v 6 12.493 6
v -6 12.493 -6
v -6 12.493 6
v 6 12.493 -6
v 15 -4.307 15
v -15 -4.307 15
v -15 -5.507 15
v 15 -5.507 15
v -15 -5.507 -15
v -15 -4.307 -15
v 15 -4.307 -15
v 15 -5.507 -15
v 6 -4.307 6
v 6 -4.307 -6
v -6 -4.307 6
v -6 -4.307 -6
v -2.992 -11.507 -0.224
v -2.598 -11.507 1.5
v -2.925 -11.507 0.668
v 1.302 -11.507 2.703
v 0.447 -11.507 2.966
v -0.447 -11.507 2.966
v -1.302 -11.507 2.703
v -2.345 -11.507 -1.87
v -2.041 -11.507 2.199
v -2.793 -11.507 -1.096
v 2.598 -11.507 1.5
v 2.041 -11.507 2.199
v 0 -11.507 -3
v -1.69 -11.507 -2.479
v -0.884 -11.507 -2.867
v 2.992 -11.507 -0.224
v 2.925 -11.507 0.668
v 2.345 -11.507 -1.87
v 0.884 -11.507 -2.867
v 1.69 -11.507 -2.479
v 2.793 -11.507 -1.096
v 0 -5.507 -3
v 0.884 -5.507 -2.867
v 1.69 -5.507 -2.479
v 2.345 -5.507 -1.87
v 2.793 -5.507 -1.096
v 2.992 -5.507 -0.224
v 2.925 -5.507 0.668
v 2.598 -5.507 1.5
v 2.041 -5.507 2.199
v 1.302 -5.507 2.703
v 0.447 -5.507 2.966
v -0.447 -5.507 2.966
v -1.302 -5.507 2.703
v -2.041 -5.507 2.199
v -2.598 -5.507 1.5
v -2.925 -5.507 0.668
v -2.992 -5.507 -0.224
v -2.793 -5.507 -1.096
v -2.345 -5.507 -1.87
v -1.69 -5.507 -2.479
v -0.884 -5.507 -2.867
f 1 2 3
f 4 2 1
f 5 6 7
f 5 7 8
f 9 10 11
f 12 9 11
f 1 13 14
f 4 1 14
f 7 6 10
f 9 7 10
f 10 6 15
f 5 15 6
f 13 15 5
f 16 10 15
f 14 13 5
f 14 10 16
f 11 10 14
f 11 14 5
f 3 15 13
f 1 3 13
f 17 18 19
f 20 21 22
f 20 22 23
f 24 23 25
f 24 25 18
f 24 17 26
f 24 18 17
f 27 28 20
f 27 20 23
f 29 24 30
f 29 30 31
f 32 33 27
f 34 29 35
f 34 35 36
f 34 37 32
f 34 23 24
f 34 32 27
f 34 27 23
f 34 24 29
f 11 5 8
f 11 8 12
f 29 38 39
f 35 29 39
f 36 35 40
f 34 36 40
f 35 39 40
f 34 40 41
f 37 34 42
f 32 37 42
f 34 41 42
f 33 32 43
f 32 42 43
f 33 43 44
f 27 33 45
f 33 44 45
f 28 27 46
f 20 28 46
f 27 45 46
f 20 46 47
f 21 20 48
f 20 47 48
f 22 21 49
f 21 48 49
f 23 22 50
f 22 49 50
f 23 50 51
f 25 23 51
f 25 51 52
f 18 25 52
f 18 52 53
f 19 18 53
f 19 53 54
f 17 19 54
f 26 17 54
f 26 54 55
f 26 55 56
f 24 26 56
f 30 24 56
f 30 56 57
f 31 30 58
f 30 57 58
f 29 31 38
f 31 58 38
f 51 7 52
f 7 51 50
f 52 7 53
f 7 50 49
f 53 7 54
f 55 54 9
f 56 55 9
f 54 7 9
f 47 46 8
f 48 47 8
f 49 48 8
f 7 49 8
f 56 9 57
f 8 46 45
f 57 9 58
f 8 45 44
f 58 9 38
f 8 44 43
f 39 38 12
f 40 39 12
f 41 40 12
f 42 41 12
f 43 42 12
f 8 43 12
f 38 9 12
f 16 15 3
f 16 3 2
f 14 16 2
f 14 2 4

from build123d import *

# Parameters (mm, degrees)
SKETCH1_W           = 2
SKETCH1_H           = 2
BOSS_EXTRUDE1_DEPTH = 2.8
SKETCH2_W           = 5
SKETCH2_H           = 5
BOSS_EXTRUDE2_DEPTH = 0.2
SKETCH3_R           = 0.5
BOSS_EXTRUDE3_DEPTH = 1
SCALE1_SCALE        = 6


with BuildPart() as part:
    # Sketch1 → Boss-Extrude1 (new body)
    with BuildSketch(Plane(origin=(0, 0, 0), x_dir=(1, 0, 0), z_dir=(0, 1, 0))):
        Rectangle(SKETCH1_W, SKETCH1_H)
    extrude(amount=BOSS_EXTRUDE1_DEPTH)

    # Sketch2 → Boss-Extrude2 (add)
    with BuildSketch(Plane(origin=(0, 0, 0), x_dir=(1, 0, 0), z_dir=(0, 1, 0))):
        Rectangle(SKETCH2_W, SKETCH2_H)
    extrude(amount=-BOSS_EXTRUDE2_DEPTH)

    # Sketch3 → Boss-Extrude3 (add)
    with BuildSketch(Plane(origin=(0, -0.2, 0), x_dir=(-1, 0, 0), z_dir=(0, -1, 0))):
        with Locations(Location((0, 0, 0), (0, 0, 90))):
            Circle(SKETCH3_R)
    extrude(amount=BOSS_EXTRUDE3_DEPTH)


with BuildPart() as part_1:
    # Scale1: scaled about (0, 0.861341085, 0)
    add(part.part.scale(SCALE1_SCALE).moved(Location((0, -4.306705425, 0))))


solid = part_1.part
